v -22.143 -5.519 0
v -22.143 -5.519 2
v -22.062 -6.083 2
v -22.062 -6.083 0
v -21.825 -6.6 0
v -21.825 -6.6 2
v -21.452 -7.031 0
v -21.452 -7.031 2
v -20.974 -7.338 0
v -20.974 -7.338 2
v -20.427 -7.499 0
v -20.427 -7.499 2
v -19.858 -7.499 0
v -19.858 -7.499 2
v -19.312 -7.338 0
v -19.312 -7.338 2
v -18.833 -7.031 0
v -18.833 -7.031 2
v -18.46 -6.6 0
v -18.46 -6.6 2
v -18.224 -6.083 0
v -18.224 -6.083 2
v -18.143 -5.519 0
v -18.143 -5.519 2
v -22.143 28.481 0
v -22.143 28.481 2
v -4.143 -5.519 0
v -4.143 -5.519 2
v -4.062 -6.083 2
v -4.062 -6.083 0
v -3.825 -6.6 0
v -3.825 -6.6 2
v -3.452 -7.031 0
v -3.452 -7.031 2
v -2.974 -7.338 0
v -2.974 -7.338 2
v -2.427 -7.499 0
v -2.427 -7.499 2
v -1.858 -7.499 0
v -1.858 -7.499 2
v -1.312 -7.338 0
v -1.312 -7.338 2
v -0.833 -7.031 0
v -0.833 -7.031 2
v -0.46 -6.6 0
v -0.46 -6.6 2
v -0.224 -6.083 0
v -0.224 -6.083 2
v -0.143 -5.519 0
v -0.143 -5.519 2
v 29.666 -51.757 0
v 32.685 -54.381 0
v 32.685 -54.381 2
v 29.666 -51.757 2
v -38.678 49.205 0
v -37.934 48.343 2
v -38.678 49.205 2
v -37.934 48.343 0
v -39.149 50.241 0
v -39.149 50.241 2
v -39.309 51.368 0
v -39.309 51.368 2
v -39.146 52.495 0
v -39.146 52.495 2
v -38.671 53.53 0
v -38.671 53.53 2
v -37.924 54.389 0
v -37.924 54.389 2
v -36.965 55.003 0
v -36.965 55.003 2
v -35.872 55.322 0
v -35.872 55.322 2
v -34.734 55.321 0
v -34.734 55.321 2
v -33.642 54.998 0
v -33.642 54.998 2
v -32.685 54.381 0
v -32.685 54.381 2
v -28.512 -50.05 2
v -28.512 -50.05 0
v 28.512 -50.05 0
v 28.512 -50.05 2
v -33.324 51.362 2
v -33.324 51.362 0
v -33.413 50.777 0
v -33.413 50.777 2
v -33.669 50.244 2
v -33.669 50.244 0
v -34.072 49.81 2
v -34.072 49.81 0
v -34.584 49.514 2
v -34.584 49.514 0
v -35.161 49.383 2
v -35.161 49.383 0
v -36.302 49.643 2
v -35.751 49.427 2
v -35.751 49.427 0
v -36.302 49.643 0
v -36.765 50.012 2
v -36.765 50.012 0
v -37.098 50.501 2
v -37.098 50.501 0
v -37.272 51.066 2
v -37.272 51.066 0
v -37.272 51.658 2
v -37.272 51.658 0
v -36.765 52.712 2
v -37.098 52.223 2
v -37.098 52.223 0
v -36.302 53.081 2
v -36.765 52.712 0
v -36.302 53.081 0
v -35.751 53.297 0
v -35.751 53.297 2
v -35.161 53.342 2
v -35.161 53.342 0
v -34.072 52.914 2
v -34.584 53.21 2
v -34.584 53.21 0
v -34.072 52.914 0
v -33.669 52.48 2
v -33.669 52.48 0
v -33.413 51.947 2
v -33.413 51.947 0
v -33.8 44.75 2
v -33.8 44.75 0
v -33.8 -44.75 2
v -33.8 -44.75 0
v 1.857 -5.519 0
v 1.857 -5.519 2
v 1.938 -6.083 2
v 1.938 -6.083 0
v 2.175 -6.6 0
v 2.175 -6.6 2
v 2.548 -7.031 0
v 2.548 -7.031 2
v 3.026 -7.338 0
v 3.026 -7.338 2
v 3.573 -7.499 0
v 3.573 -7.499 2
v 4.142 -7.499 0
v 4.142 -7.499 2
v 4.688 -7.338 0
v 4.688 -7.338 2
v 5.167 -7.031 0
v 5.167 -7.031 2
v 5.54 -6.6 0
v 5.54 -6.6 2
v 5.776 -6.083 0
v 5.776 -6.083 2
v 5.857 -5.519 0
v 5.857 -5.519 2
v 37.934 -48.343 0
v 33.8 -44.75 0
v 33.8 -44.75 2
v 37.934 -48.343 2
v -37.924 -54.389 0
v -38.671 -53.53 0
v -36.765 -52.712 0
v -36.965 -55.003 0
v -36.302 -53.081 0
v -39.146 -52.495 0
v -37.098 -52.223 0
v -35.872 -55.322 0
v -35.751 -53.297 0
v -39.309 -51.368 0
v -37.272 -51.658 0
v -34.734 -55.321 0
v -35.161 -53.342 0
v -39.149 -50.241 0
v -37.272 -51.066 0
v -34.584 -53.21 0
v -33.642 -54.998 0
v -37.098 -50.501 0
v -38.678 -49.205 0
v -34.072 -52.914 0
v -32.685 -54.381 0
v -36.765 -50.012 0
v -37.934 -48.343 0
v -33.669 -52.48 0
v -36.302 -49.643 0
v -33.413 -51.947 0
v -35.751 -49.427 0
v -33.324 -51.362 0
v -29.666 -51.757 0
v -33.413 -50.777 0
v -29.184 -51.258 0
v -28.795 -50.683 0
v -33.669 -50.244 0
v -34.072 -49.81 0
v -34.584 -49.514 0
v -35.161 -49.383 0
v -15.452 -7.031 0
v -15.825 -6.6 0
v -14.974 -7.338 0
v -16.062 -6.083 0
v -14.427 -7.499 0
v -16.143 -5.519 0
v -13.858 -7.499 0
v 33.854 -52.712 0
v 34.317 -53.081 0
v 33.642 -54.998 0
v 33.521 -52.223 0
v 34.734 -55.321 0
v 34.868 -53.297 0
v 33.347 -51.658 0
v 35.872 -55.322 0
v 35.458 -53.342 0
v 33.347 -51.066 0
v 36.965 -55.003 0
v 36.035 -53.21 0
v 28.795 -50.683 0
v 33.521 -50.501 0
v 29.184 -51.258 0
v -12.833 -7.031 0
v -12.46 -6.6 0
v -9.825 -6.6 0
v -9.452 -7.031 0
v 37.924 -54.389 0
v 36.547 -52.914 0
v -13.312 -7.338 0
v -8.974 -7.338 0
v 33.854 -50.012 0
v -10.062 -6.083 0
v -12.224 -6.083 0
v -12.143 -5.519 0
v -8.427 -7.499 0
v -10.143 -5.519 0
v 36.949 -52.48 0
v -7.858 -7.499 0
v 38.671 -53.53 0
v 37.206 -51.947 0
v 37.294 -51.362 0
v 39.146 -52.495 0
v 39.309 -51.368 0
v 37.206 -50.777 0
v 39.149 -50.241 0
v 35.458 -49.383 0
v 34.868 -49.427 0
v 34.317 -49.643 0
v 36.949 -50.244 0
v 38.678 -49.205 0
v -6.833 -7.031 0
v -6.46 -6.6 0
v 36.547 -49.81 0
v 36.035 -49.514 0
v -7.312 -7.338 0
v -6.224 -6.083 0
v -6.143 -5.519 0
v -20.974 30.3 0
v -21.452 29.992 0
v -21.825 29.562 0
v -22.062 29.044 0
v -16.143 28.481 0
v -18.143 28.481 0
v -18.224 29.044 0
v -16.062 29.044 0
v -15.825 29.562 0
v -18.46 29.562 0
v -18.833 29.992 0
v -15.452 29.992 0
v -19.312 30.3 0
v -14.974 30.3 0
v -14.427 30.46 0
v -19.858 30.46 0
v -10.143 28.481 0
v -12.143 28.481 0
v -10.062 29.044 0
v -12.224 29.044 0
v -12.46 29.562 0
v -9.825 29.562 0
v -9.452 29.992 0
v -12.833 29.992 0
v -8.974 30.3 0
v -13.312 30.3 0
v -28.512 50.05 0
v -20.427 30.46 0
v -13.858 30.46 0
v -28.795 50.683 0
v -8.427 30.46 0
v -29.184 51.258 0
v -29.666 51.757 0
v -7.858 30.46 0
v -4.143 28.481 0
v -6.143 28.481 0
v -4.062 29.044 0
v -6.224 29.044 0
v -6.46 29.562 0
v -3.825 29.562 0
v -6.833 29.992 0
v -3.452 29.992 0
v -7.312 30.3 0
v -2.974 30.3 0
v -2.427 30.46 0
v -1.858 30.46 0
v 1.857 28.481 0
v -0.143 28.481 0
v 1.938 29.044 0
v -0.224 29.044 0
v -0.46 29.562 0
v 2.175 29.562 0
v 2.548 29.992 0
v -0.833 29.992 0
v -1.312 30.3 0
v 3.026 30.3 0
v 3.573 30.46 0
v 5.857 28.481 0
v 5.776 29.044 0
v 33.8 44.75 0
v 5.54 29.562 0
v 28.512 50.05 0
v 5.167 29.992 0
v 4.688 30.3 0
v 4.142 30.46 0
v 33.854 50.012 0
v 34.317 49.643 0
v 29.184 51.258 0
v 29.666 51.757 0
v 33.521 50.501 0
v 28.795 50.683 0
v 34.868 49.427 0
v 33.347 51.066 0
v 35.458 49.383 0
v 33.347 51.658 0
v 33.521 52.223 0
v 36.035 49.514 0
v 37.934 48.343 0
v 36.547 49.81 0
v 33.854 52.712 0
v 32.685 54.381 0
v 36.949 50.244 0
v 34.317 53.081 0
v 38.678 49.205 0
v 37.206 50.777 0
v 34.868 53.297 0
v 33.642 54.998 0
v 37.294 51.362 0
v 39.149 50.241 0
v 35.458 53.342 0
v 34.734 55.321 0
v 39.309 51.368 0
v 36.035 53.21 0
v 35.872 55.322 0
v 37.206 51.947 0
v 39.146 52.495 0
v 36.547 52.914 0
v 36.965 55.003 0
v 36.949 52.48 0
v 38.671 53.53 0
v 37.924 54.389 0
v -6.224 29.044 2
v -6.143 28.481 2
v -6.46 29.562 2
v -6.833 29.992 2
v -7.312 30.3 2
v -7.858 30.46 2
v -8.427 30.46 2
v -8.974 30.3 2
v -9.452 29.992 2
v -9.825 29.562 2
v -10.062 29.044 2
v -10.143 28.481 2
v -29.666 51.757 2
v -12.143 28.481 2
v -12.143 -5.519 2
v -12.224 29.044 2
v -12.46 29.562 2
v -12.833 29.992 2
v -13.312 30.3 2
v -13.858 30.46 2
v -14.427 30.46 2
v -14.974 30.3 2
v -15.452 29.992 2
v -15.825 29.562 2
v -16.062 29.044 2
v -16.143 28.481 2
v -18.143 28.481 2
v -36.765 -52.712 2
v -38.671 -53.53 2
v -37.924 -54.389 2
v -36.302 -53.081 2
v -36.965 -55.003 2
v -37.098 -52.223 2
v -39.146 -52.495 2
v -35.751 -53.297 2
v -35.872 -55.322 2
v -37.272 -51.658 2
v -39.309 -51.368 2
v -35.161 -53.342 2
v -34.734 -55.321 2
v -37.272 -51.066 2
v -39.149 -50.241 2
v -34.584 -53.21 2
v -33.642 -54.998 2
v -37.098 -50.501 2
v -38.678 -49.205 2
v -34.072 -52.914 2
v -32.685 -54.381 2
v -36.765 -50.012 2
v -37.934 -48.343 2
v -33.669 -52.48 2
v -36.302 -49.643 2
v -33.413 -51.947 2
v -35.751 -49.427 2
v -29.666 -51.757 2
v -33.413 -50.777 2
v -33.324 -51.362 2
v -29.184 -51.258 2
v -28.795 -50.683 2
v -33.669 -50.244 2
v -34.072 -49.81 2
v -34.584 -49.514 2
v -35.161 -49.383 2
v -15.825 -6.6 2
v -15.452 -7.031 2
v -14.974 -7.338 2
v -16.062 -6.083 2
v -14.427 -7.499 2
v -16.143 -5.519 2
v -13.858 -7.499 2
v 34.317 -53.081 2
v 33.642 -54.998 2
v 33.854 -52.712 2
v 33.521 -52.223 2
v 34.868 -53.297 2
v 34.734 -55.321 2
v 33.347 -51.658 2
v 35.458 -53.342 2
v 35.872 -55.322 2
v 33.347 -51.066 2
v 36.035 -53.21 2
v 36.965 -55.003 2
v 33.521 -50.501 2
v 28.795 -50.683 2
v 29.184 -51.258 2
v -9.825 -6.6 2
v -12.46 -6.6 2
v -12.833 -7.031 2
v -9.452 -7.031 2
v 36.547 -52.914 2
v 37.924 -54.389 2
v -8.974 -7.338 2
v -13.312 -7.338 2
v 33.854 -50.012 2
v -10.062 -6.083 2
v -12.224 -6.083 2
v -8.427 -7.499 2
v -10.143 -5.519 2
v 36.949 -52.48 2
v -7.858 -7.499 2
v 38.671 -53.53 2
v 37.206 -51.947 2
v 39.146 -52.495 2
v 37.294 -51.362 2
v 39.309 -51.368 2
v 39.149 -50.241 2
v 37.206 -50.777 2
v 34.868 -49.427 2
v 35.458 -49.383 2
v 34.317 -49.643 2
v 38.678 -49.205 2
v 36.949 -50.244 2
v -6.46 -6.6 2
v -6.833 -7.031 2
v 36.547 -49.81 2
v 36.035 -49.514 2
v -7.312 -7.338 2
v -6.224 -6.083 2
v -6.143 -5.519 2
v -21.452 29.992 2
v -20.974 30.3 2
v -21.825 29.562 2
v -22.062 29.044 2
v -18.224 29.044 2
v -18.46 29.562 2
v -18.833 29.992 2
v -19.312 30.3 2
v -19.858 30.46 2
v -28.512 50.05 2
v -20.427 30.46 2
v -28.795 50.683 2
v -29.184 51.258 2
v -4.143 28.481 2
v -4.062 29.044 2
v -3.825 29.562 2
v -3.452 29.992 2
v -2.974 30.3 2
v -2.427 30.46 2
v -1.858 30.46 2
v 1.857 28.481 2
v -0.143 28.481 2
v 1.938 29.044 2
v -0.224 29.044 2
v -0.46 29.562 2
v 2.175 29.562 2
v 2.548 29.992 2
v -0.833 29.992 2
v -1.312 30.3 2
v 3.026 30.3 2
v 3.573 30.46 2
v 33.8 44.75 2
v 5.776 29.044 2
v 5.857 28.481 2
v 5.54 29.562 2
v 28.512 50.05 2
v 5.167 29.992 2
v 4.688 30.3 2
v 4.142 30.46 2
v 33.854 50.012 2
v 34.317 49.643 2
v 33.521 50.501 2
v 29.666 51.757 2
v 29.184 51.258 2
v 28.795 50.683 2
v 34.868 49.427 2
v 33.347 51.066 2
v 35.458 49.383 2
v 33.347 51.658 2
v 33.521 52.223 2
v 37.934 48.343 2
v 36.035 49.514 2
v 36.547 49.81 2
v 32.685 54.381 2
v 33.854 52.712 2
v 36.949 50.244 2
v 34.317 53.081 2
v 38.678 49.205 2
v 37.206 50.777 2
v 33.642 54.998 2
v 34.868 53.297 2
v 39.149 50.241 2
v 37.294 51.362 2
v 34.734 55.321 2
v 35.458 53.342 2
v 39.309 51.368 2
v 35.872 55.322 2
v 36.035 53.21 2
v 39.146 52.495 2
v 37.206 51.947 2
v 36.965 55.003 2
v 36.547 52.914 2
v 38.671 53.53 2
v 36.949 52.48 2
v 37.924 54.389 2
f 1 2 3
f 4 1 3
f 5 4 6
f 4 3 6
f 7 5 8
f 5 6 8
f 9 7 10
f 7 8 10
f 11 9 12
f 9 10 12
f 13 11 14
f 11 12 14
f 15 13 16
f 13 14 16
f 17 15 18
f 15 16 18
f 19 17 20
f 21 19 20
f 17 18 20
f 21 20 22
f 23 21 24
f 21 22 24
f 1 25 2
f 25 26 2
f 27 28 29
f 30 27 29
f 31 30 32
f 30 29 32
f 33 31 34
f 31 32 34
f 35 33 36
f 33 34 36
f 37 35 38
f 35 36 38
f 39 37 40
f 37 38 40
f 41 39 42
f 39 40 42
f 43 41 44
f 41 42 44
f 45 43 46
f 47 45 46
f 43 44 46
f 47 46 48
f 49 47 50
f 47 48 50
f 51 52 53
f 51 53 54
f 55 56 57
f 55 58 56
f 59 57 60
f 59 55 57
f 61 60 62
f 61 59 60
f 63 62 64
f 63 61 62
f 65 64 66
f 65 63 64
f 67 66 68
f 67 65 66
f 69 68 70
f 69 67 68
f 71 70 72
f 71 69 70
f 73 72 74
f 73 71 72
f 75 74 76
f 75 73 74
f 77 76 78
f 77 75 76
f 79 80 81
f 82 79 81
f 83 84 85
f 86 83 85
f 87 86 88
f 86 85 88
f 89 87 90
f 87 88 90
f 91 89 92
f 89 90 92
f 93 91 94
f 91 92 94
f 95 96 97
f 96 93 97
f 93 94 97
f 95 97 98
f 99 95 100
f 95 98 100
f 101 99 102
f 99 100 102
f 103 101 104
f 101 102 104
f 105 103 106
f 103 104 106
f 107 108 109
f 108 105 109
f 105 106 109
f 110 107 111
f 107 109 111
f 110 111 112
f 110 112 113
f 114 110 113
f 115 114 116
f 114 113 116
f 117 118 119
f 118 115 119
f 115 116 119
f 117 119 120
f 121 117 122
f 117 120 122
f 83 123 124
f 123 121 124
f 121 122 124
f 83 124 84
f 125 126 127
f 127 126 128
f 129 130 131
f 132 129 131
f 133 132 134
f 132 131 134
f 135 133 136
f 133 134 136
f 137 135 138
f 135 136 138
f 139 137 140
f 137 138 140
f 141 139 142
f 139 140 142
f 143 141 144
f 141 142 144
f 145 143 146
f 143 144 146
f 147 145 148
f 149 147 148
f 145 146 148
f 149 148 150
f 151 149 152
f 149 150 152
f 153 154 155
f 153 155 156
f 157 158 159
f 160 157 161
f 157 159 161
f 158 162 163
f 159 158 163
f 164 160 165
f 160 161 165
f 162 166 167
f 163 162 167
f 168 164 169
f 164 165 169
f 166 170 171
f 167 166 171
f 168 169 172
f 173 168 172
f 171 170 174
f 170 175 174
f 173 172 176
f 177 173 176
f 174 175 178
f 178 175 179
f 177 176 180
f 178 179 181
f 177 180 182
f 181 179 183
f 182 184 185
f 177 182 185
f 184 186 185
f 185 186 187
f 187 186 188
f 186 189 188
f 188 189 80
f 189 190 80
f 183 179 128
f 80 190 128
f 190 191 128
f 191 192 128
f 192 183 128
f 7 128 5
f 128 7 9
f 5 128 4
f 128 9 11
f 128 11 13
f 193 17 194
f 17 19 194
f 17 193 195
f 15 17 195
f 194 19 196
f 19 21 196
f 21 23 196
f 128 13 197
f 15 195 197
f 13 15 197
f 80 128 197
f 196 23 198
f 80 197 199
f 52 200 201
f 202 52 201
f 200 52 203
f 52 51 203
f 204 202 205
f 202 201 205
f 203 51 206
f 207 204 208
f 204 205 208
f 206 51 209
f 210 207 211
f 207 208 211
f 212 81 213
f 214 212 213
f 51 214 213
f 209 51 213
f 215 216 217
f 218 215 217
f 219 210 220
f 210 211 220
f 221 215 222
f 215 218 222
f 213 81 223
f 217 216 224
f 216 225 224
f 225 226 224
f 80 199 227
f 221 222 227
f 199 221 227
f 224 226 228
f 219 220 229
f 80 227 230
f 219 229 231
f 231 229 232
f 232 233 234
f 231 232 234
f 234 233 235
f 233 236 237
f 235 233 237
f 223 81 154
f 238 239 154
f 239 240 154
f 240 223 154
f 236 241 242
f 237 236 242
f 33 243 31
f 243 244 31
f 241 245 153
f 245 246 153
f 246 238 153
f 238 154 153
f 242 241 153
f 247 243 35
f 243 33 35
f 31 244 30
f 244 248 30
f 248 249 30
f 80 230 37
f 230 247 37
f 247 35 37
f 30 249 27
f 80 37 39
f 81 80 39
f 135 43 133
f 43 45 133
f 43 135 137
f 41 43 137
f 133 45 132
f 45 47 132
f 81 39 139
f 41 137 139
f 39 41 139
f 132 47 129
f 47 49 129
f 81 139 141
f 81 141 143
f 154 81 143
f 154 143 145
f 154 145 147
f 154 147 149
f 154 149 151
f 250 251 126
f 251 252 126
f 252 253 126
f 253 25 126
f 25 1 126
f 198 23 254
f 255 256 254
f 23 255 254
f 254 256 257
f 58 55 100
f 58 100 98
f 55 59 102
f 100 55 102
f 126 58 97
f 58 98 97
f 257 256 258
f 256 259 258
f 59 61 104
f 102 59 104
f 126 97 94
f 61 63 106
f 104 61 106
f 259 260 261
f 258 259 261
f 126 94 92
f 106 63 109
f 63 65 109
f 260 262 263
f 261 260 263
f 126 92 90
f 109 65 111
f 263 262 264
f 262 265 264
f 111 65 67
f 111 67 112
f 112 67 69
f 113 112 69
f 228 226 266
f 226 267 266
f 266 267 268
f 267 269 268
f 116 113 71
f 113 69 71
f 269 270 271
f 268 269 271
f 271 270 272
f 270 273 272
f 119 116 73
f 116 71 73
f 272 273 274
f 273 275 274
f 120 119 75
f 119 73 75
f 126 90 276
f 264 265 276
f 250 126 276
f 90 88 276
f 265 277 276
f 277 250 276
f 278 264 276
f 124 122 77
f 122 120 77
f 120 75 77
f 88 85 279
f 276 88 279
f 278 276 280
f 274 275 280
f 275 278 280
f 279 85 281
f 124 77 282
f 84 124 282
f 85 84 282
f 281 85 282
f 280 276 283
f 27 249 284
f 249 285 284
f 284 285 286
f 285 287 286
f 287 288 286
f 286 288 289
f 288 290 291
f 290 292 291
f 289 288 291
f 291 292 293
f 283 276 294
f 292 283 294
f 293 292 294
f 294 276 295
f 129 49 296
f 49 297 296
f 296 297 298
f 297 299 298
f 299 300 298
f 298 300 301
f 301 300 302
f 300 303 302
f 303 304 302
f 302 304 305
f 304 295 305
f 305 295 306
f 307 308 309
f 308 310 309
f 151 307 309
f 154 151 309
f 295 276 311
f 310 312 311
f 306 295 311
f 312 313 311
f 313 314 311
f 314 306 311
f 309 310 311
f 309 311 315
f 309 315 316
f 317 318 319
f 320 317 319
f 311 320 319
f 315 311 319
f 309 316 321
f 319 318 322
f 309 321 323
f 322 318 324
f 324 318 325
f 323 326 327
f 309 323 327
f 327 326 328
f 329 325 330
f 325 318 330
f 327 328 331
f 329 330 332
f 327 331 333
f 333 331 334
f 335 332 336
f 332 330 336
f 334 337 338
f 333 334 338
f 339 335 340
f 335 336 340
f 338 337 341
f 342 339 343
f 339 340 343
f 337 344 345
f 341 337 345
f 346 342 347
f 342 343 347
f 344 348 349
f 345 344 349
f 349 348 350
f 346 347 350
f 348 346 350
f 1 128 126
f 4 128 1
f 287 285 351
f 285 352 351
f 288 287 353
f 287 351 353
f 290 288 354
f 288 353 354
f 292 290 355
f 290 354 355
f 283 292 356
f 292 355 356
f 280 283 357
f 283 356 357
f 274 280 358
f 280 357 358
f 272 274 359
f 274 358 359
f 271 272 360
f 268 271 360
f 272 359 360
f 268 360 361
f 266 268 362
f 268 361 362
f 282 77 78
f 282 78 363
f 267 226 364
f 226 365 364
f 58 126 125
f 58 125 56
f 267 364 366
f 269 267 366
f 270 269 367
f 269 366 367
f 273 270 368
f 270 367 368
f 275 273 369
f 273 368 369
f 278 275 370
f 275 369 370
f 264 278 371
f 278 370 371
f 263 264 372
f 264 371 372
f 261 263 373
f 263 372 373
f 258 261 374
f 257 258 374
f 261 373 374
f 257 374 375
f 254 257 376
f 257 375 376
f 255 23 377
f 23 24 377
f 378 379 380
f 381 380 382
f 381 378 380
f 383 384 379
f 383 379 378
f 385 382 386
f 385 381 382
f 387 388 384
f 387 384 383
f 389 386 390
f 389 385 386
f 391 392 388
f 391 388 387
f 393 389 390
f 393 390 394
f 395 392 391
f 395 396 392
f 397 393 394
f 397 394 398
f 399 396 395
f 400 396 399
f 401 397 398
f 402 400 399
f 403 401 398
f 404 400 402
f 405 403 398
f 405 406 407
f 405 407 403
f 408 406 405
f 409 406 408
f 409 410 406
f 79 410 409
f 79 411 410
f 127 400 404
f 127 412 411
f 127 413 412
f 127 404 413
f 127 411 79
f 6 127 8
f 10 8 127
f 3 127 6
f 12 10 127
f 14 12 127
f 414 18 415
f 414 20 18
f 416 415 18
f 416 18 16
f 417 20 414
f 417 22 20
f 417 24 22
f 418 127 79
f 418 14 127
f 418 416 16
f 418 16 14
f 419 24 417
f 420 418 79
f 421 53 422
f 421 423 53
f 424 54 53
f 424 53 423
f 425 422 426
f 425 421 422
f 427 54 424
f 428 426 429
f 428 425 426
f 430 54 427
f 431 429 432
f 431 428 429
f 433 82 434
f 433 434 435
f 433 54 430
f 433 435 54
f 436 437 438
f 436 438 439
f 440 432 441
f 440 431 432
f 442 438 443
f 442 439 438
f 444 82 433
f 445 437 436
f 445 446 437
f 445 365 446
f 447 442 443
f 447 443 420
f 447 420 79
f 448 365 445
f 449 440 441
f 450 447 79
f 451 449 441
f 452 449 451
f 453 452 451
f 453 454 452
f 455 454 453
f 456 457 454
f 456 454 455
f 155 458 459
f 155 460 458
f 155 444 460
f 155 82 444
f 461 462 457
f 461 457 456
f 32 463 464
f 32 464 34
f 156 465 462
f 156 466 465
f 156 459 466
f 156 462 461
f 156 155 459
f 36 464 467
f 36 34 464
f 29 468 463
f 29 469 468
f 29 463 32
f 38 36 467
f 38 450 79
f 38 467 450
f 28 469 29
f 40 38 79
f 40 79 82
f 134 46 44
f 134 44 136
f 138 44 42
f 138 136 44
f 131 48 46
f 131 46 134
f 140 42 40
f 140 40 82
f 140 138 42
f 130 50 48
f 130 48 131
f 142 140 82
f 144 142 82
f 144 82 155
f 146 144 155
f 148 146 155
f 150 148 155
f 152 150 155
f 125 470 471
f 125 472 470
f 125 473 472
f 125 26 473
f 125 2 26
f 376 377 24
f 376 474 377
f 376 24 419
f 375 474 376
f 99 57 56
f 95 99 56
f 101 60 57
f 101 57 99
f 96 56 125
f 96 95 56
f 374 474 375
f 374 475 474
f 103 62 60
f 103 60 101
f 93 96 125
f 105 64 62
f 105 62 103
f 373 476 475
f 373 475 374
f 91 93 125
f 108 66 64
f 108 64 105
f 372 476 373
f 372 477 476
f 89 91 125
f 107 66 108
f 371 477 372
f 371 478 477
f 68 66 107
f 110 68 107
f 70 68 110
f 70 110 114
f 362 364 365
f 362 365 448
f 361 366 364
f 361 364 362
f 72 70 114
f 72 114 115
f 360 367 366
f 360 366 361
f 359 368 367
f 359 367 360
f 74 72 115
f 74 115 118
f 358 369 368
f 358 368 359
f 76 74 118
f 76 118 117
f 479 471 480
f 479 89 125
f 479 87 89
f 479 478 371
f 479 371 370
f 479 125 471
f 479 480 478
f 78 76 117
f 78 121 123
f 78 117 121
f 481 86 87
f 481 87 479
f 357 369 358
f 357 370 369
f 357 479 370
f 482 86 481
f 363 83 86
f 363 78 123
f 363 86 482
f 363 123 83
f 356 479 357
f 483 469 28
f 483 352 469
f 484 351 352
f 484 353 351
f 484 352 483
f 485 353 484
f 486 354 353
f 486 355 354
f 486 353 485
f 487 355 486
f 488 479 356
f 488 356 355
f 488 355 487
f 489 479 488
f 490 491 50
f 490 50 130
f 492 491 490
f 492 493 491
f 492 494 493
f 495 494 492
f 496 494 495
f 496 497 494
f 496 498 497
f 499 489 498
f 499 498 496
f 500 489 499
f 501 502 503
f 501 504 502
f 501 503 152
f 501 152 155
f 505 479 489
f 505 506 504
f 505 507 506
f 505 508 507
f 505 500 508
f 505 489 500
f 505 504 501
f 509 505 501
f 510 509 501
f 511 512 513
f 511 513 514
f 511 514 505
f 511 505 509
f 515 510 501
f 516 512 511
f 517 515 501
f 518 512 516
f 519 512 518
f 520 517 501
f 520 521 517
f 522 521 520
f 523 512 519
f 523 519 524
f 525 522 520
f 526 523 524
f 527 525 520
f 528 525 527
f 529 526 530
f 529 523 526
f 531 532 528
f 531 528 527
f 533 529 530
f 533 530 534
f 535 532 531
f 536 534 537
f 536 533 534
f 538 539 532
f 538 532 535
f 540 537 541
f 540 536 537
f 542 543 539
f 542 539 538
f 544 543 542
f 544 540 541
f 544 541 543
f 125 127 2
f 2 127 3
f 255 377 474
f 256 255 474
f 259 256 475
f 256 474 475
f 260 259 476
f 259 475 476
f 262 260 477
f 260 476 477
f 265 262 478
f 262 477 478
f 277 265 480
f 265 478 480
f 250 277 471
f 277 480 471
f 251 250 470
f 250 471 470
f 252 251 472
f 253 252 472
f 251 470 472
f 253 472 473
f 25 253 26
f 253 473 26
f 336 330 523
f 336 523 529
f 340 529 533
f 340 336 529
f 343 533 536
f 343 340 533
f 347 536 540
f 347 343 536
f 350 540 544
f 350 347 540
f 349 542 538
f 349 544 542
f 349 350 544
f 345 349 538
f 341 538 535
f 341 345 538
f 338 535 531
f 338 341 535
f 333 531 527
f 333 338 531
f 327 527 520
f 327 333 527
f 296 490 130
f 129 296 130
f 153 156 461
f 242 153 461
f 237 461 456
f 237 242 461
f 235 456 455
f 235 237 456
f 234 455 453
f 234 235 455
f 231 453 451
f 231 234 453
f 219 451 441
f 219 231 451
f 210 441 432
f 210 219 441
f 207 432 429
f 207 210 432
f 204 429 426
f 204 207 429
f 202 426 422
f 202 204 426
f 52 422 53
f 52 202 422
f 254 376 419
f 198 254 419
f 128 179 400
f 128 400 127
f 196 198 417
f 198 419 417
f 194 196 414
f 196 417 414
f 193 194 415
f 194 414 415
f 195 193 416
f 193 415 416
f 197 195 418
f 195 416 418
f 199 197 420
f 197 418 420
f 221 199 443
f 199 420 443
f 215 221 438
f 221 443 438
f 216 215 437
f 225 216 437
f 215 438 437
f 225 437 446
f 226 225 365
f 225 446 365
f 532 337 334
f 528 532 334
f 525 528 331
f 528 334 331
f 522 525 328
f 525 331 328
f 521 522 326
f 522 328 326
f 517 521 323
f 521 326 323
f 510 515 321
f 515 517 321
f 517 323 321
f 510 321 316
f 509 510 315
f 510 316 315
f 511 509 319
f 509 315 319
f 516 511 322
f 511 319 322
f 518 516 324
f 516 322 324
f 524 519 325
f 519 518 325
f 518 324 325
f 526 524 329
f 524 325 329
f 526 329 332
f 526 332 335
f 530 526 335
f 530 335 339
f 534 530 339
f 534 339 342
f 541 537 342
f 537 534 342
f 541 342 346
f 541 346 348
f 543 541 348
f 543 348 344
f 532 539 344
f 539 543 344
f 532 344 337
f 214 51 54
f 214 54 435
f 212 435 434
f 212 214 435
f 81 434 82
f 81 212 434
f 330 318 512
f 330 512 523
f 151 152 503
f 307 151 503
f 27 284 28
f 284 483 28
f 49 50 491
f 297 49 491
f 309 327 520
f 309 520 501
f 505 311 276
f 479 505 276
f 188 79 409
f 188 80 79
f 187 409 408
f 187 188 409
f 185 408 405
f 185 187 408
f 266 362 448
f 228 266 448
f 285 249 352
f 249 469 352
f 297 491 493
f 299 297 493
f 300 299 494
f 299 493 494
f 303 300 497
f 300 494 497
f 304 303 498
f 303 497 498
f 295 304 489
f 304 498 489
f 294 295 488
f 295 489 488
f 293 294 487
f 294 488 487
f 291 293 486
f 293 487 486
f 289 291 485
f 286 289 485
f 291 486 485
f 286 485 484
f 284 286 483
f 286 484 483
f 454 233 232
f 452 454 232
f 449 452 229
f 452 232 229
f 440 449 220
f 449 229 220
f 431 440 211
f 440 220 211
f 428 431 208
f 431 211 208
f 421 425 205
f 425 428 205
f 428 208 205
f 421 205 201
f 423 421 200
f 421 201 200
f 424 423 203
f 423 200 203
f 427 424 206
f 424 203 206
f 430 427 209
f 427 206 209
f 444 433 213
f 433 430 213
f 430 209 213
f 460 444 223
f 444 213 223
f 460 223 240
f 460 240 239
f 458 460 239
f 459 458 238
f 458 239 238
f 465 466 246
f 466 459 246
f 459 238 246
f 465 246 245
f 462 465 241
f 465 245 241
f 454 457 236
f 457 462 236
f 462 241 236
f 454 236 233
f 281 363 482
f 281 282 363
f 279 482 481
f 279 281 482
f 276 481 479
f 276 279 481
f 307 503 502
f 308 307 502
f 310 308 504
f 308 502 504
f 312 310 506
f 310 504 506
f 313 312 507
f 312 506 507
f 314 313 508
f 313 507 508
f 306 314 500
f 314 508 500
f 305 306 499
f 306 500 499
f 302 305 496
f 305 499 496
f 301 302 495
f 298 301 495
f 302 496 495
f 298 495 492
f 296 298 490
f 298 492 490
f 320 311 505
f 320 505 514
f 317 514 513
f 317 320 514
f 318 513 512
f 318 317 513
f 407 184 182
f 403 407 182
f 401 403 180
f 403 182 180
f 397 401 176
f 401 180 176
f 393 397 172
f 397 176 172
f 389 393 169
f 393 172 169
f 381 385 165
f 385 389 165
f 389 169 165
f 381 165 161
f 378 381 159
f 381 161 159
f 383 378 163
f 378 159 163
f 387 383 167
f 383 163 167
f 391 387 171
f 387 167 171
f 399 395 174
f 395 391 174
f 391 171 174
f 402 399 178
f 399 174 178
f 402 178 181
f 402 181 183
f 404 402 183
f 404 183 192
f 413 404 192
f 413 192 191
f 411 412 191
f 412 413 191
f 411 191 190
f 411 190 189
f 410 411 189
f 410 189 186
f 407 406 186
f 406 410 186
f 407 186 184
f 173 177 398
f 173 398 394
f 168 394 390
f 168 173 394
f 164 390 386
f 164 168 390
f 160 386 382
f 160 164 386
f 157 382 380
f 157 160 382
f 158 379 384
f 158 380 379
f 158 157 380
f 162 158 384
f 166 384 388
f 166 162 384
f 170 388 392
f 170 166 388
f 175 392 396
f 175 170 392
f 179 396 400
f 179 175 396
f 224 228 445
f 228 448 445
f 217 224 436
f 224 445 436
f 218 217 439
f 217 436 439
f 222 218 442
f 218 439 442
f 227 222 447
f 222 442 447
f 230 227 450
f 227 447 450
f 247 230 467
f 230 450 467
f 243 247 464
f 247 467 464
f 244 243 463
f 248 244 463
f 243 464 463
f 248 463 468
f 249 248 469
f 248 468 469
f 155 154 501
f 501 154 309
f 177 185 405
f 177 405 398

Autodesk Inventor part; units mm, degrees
ref_plane "YZ Plane" through (0, 0, 0) normal (1, 0, 0) x (0, 1, 0)
ref_plane "XZ Plane" through (0, 0, 0) normal (0, 1, 0) x (-1, 0, 0)
ref_plane "XY Plane" through (0, 0, 0) normal (0, 0, 1) x (1, 0, 0)
sketch "Sketch1" plane through (0, 0, 0) normal (0, 0, 1) x (1, 0, 0)
  circle A0 centre (35.3094, -51.3621) radius 1.985 projected
  circle A1 centre (-35.3094, -51.3621) radius 1.985 projected
  circle A2 centre (-35.3094, 51.3621) radius 1.985 projected
  circle A3 centre (35.3094, 51.3621) radius 1.985 projected
  line L0 (28.5119, 50.05) -> (-28.5119, 50.05) projected
  arc A4 (-28.5119, 50.05) -> (-29.6663, 51.7567) centre (-32.2906, 48.7379) ccw projected
  line L1 (-32.6852, 54.381) -> (-29.6663, 51.7567) projected
  arc A5 (-32.6852, 54.381) -> (-37.9337, 48.3433) centre (-35.3094, 51.3621) ccw projected
  line L2 (-33.8, 44.7499) -> (-37.9337, 48.3433) projected
  line L3 (-33.8, 44.7499) -> (-33.8, -44.7499) projected
  line L4 (-37.9337, -48.3433) -> (-33.8, -44.7499) projected
  arc A6 (-37.9337, -48.3433) -> (-32.6852, -54.381) centre (-35.3094, -51.3621) ccw projected
  line L5 (-29.6663, -51.7567) -> (-32.6852, -54.381) projected
  arc A7 (-29.6663, -51.7567) -> (-28.5119, -50.05) centre (-32.2906, -48.7379) ccw projected
  line L6 (-28.5119, -50.05) -> (28.5119, -50.05) projected
  arc A8 (28.5119, -50.05) -> (29.6663, -51.7567) centre (32.2906, -48.7379) ccw projected
  line L7 (32.6852, -54.381) -> (29.6663, -51.7567) projected
  arc A9 (32.6852, -54.381) -> (37.9337, -48.3433) centre (35.3094, -51.3621) ccw projected
  line L8 (33.8, -44.7499) -> (37.9337, -48.3433) projected
  line L9 (33.8, -44.7499) -> (33.8, 44.7499) projected
  line L10 (37.9337, 48.3433) -> (33.8, 44.7499) projected
  arc A10 (37.9337, 48.3433) -> (32.6852, 54.381) centre (35.3094, 51.3621) ccw projected
  line L11 (29.6663, 51.7567) -> (32.6852, 54.381) projected
  arc A11 (29.6663, 51.7567) -> (28.5119, 50.05) centre (32.2906, 48.7379) ccw projected
  line L12 (-30.6, -44.85) -> (-30.6, 44.85) projected
  arc A12 (-28.6, 46.85) -> (-30.6, 44.85) centre (-28.6, 44.85) ccw projected
  line L13 (-28.6, 46.85) -> (28.6, 46.85) projected
  arc A13 (30.6, 44.85) -> (28.6, 46.85) centre (28.6, 44.85) ccw projected
  line L14 (30.6, 44.85) -> (30.6, -44.85) projected
  arc A14 (28.6, -46.85) -> (30.6, -44.85) centre (28.6, -44.85) ccw projected
  line L15 (28.6, -46.85) -> (-28.6, -46.85) projected
  arc A15 (-30.6, -44.85) -> (-28.6, -46.85) centre (-28.6, -44.85) ccw projected
  point P0 (0, 0)
extrude "Extrusion1" add sketch "Sketch1" along normal blind 2 contours A11 L11 A10 L10 L9 L8 A9 L7 A8 L6 A7 L5 A6 L4 L3 L2 A5 L1 A4 L0 | L12 A12 L13 A13 L14 A14 L15 A15
sketch "Sketch3" plane through (0, 0, 2) normal (0, 0, 1) x (1, 0, 0)
  line L0 (-5.7986, 18.4674) -> (8.3133, 18.4674) projected
  line L1 (8.3133, 18.4674) -> (8.3133, 4.4942) projected
  line L2 (8.3133, 4.4942) -> (-5.7986, 4.4942) projected
  line L3 (-5.7986, 4.4942) -> (-5.7986, 18.4674) projected
  line L4 (-8.1427, -5.5192) -> (-8.1427, 28.4808) construction
  line L5 (-6.1427, -5.5192) -> (-6.1427, 28.4808)
  line L6 (-10.1427, 28.4808) -> (-10.1427, -5.5192)
  arc A0 (-10.1427, -5.5192) -> (-6.1427, -5.5192) centre (-8.1427, -5.5192) ccw
  arc A1 (-6.1427, 28.4808) -> (-10.1427, 28.4808) centre (-8.1427, 28.4808) ccw
  arc A2 (-0.1427, 28.4808) -> (-4.1427, 28.4808) centre (-2.1427, 28.4808) ccw
  line L7 (-0.1427, -5.5192) -> (-0.1427, 28.4808)
  line L8 (-4.1427, 28.4808) -> (-4.1427, -5.5192)
  arc A3 (-4.1427, -5.5192) -> (-0.1427, -5.5192) centre (-2.1427, -5.5192) ccw
  line L9 (5.8573, -5.5192) -> (5.8573, 28.4808)
  arc A4 (5.8573, 28.4808) -> (1.8573, 28.4808) centre (3.8573, 28.4808) ccw
  line L10 (1.8573, 28.4808) -> (1.8573, -5.5192)
  arc A5 (1.8573, -5.5192) -> (5.8573, -5.5192) centre (3.8573, -5.5192) ccw
  line L11 (-16.1427, 28.4808) -> (-16.1427, -5.5192)
  arc A6 (-12.1427, 28.4808) -> (-16.1427, 28.4808) centre (-14.1427, 28.4808) ccw
  line L12 (-12.1427, -5.5192) -> (-12.1427, 28.4808)
  arc A7 (-16.1427, -5.5192) -> (-12.1427, -5.5192) centre (-14.1427, -5.5192) ccw
  line L13 (-22.1427, 28.4808) -> (-22.1427, -5.5192)
  arc A8 (-18.1427, 28.4808) -> (-22.1427, 28.4808) centre (-20.1427, 28.4808) ccw
  line L14 (-18.1427, -5.5192) -> (-18.1427, 28.4808)
  arc A9 (-22.1427, -5.5192) -> (-18.1427, -5.5192) centre (-20.1427, -5.5192) ccw
  point P0 (0, 0)
  point P1 (-8.1427, 11.4808)
  dimension "d8" = 17
  dimension "d9" = 4
  dimension "d12" = 6
  dimension "d19" = 6
  dimension "d26" = 6
extrude "Extrusion3" cut sketch "Sketch3" against normal up to surface (2 mm away) contours L8 A2 L7 L0 | L0 L7 L2 L8 | L2 L7 A3 L8 | L10 A4 L9 L0 | L0 L9 L2 L10 | L2 L9 A5 L10 | A0 L6 A1 L5 | A6 L12 A7 L11 | A8 L14 A9 L13
properties part number "Case Cover Rev D"
